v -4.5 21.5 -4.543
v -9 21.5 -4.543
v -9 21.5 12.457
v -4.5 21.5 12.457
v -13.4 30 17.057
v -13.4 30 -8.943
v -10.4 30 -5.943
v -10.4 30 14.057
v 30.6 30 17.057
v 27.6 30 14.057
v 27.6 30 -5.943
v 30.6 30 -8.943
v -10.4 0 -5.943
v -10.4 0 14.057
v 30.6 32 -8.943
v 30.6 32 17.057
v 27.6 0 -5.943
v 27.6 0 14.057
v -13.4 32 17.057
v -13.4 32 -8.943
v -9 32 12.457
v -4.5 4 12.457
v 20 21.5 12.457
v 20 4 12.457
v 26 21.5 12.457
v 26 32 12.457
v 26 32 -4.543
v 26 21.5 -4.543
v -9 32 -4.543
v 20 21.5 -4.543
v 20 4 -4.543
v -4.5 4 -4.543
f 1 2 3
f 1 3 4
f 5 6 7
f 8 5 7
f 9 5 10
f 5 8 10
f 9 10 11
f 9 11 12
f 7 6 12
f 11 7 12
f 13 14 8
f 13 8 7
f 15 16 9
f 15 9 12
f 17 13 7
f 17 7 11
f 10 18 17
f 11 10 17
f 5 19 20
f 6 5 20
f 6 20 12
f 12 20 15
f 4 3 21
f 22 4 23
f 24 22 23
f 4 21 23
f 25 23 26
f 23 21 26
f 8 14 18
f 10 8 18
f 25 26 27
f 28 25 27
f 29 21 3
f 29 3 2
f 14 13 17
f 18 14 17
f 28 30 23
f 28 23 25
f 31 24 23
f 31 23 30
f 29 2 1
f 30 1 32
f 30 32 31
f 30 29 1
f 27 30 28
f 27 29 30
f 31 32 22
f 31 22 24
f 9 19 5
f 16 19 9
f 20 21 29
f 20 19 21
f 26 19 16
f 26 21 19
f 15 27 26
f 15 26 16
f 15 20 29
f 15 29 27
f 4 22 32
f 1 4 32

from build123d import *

# Parameters (mm, degrees)
SKETCH1_W           = 38
SKETCH1_H           = 20
BOSS_EXTRUDE1_DEPTH = 32
SKETCH2_W           = 35
SKETCH2_H           = 17
CUT_EXTRUDE1_DEPTH  = 28
SKETCH3_W           = 4.5
SKETCH3_H           = 17
SKETCH3_W_2         = 6
BOSS_EXTRUDE2_DEPTH = 17.5
SKETCH4_W           = 44
SKETCH4_H           = 26
SKETCH4_W_2         = 38
SKETCH4_H_2         = 20
EXTRUDE_THIN2_DEPTH = 2


with BuildPart() as part:
    # Sketch1 → Boss-Extrude1 (new body)
    with BuildSketch(Plane(origin=(0, 0, 0), x_dir=(1, 0, 0), z_dir=(0, 1, 0))):
        with Locations((8.6, -4.057142857)):
            Rectangle(SKETCH1_W, SKETCH1_H)
    extrude(amount=BOSS_EXTRUDE1_DEPTH)

    # Sketch2 → Cut-Extrude1 (cut)
    with BuildSketch(Plane(origin=(0, 32, 0), x_dir=(1, 0, 0), z_dir=(0, 1, 0))):
        with Locations((8.5, -3.957142857)):
            Rectangle(SKETCH2_W, SKETCH2_H)
    extrude(amount=-CUT_EXTRUDE1_DEPTH, mode=Mode.SUBTRACT)

    # Sketch3 → Boss-Extrude2 (add)
    with BuildSketch(Plane(origin=(0, 4, 0), x_dir=(1, 0, 0), z_dir=(0, 1, 0))):
        with Locations((-6.75, -3.957142857)):
            Rectangle(SKETCH3_W, SKETCH3_H)
        with Locations((23, -3.957142857)):
            Rectangle(SKETCH3_W_2, SKETCH3_H)
    extrude(amount=BOSS_EXTRUDE2_DEPTH)

    # Sketch4 → Extrude-Thin2 (add)
    with BuildSketch(Plane(origin=(0, 32, 0), x_dir=(1, 0, 0), z_dir=(0, 1, 0))):
        with Locations((8.6, -4.057142857)):
            Rectangle(SKETCH4_W, SKETCH4_H)
        with Locations((8.6, -4.057142857)):
            Rectangle(SKETCH4_W_2, SKETCH4_H_2, mode=Mode.SUBTRACT)
    extrude(amount=-EXTRUDE_THIN2_DEPTH)


solid = part.part
